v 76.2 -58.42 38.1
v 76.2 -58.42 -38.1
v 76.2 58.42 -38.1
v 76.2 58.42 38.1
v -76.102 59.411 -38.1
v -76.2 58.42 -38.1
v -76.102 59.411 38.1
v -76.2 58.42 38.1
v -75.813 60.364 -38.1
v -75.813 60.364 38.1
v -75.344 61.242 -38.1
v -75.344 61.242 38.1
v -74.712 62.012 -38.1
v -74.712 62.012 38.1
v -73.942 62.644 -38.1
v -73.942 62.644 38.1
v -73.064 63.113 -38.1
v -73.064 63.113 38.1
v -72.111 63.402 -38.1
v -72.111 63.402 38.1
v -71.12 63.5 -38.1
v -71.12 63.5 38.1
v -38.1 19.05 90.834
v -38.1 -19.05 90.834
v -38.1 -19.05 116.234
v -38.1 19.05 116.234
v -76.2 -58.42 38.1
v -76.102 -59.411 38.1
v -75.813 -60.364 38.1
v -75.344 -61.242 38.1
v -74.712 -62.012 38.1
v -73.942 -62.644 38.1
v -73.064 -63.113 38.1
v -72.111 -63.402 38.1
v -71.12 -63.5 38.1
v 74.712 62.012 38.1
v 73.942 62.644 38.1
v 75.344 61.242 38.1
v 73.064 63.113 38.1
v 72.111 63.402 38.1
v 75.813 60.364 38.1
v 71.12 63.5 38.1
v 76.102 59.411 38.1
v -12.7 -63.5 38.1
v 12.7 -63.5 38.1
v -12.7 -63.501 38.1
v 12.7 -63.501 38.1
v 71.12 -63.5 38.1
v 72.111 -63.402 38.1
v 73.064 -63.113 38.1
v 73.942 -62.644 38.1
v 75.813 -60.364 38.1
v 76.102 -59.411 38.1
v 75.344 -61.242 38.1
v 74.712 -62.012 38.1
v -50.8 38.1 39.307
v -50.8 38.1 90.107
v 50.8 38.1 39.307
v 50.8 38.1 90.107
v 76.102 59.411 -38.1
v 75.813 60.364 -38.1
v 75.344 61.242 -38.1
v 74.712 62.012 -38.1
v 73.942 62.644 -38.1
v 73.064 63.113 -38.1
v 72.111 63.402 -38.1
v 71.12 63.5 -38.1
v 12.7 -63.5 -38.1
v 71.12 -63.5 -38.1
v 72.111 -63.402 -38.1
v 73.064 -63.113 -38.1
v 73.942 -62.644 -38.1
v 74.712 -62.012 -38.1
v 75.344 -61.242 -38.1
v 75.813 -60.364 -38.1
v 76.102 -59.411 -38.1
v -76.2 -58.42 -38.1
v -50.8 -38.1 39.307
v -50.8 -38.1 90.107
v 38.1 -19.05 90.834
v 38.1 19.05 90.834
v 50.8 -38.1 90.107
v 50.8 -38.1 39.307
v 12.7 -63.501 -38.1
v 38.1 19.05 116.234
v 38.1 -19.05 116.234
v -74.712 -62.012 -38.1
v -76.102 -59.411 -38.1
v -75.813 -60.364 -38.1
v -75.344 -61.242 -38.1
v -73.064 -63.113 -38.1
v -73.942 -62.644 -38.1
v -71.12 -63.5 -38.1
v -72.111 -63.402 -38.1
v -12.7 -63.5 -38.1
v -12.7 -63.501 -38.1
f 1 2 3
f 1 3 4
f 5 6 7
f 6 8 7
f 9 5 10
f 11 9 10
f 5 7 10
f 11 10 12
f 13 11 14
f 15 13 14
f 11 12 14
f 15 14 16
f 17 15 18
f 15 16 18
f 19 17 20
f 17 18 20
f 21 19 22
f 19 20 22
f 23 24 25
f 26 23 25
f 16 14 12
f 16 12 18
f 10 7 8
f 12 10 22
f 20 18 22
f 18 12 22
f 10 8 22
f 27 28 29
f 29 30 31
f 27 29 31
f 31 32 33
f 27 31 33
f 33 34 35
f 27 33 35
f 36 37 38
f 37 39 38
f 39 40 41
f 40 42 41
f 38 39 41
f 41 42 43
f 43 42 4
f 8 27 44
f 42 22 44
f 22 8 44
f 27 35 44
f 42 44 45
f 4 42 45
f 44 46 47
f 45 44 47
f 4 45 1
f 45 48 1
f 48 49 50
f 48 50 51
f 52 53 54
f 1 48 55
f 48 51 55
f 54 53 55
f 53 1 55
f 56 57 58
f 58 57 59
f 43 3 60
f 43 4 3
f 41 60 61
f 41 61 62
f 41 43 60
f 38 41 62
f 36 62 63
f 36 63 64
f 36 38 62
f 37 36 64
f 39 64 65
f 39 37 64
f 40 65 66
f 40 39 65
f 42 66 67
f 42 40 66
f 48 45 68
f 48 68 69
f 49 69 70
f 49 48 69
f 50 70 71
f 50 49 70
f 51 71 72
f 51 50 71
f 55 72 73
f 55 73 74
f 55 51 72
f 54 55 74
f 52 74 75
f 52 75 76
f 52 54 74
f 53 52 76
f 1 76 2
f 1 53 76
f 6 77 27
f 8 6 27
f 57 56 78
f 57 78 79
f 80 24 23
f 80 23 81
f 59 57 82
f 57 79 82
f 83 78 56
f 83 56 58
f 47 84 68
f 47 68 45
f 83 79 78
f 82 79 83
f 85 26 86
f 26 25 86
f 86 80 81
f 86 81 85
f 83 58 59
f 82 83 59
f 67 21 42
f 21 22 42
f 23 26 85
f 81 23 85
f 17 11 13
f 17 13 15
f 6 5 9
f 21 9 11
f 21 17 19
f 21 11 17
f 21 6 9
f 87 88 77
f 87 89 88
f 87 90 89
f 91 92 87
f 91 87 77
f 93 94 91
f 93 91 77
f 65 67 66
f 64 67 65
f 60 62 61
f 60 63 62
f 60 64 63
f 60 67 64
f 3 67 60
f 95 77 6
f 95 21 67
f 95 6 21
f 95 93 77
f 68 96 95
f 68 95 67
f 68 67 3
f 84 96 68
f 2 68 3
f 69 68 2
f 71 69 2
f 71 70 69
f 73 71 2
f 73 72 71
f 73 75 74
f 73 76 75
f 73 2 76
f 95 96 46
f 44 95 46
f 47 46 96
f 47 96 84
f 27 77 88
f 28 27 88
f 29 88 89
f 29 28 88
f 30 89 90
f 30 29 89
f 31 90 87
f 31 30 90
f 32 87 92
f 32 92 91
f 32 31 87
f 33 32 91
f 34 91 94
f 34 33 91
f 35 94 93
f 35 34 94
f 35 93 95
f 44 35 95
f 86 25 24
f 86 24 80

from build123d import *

# Parameters (mm, degrees)
F0_W     = 152.4
F0_H     = 76.2
F1_DEPTH = 63.5
F2_W     = 101.6
F2_H     = 50.8
F3_DEPTH = 38.1
F4_W     = 76.2
F4_H     = 25.4
F5_DEPTH = 19.05
F6_R     = 5.08
F7_W     = 25.4
F7_H     = 76.2
F8_DEPTH = 0.00127


with BuildPart() as f1:
    # F0 (on Front) → F1 (new body, symmetric)
    with BuildSketch(Plane.XZ):
        Rectangle(F0_W, F0_H)
    extrude(amount=F1_DEPTH, both=True)

    # F6
    f6_edges = [f1.edges().sort_by_distance(p)[0] for p in [
        (-76.2, -63.5, 0),
        (76.2, -63.5, 0),
        (76.2, 63.5, 0),
        (-76.2, 63.5, 0),
    ]]
    fillet(f6_edges, radius=F6_R)

    # F7 (on face) → F8 (join, symmetric)
    with BuildSketch(Plane.XZ.offset(63.5)):
        Rectangle(F7_W, F7_H)
    extrude(amount=F8_DEPTH, both=True)


with BuildPart() as f3:
    # F2 (on Front) → F3 (new body, symmetric)
    with BuildSketch(Plane.XZ):
        with Locations((0, 64.707212)):
            Rectangle(F2_W, F2_H)
    extrude(amount=F3_DEPTH, both=True)


with BuildPart() as f5:
    # F4 (on Front) → F5 (new body, symmetric)
    with BuildSketch(Plane.XZ):
        with Locations((0, 103.533939)):
            Rectangle(F4_W, F4_H)
    extrude(amount=F5_DEPTH, both=True)


solid = Compound([f1.part, f3.part, f5.part])
